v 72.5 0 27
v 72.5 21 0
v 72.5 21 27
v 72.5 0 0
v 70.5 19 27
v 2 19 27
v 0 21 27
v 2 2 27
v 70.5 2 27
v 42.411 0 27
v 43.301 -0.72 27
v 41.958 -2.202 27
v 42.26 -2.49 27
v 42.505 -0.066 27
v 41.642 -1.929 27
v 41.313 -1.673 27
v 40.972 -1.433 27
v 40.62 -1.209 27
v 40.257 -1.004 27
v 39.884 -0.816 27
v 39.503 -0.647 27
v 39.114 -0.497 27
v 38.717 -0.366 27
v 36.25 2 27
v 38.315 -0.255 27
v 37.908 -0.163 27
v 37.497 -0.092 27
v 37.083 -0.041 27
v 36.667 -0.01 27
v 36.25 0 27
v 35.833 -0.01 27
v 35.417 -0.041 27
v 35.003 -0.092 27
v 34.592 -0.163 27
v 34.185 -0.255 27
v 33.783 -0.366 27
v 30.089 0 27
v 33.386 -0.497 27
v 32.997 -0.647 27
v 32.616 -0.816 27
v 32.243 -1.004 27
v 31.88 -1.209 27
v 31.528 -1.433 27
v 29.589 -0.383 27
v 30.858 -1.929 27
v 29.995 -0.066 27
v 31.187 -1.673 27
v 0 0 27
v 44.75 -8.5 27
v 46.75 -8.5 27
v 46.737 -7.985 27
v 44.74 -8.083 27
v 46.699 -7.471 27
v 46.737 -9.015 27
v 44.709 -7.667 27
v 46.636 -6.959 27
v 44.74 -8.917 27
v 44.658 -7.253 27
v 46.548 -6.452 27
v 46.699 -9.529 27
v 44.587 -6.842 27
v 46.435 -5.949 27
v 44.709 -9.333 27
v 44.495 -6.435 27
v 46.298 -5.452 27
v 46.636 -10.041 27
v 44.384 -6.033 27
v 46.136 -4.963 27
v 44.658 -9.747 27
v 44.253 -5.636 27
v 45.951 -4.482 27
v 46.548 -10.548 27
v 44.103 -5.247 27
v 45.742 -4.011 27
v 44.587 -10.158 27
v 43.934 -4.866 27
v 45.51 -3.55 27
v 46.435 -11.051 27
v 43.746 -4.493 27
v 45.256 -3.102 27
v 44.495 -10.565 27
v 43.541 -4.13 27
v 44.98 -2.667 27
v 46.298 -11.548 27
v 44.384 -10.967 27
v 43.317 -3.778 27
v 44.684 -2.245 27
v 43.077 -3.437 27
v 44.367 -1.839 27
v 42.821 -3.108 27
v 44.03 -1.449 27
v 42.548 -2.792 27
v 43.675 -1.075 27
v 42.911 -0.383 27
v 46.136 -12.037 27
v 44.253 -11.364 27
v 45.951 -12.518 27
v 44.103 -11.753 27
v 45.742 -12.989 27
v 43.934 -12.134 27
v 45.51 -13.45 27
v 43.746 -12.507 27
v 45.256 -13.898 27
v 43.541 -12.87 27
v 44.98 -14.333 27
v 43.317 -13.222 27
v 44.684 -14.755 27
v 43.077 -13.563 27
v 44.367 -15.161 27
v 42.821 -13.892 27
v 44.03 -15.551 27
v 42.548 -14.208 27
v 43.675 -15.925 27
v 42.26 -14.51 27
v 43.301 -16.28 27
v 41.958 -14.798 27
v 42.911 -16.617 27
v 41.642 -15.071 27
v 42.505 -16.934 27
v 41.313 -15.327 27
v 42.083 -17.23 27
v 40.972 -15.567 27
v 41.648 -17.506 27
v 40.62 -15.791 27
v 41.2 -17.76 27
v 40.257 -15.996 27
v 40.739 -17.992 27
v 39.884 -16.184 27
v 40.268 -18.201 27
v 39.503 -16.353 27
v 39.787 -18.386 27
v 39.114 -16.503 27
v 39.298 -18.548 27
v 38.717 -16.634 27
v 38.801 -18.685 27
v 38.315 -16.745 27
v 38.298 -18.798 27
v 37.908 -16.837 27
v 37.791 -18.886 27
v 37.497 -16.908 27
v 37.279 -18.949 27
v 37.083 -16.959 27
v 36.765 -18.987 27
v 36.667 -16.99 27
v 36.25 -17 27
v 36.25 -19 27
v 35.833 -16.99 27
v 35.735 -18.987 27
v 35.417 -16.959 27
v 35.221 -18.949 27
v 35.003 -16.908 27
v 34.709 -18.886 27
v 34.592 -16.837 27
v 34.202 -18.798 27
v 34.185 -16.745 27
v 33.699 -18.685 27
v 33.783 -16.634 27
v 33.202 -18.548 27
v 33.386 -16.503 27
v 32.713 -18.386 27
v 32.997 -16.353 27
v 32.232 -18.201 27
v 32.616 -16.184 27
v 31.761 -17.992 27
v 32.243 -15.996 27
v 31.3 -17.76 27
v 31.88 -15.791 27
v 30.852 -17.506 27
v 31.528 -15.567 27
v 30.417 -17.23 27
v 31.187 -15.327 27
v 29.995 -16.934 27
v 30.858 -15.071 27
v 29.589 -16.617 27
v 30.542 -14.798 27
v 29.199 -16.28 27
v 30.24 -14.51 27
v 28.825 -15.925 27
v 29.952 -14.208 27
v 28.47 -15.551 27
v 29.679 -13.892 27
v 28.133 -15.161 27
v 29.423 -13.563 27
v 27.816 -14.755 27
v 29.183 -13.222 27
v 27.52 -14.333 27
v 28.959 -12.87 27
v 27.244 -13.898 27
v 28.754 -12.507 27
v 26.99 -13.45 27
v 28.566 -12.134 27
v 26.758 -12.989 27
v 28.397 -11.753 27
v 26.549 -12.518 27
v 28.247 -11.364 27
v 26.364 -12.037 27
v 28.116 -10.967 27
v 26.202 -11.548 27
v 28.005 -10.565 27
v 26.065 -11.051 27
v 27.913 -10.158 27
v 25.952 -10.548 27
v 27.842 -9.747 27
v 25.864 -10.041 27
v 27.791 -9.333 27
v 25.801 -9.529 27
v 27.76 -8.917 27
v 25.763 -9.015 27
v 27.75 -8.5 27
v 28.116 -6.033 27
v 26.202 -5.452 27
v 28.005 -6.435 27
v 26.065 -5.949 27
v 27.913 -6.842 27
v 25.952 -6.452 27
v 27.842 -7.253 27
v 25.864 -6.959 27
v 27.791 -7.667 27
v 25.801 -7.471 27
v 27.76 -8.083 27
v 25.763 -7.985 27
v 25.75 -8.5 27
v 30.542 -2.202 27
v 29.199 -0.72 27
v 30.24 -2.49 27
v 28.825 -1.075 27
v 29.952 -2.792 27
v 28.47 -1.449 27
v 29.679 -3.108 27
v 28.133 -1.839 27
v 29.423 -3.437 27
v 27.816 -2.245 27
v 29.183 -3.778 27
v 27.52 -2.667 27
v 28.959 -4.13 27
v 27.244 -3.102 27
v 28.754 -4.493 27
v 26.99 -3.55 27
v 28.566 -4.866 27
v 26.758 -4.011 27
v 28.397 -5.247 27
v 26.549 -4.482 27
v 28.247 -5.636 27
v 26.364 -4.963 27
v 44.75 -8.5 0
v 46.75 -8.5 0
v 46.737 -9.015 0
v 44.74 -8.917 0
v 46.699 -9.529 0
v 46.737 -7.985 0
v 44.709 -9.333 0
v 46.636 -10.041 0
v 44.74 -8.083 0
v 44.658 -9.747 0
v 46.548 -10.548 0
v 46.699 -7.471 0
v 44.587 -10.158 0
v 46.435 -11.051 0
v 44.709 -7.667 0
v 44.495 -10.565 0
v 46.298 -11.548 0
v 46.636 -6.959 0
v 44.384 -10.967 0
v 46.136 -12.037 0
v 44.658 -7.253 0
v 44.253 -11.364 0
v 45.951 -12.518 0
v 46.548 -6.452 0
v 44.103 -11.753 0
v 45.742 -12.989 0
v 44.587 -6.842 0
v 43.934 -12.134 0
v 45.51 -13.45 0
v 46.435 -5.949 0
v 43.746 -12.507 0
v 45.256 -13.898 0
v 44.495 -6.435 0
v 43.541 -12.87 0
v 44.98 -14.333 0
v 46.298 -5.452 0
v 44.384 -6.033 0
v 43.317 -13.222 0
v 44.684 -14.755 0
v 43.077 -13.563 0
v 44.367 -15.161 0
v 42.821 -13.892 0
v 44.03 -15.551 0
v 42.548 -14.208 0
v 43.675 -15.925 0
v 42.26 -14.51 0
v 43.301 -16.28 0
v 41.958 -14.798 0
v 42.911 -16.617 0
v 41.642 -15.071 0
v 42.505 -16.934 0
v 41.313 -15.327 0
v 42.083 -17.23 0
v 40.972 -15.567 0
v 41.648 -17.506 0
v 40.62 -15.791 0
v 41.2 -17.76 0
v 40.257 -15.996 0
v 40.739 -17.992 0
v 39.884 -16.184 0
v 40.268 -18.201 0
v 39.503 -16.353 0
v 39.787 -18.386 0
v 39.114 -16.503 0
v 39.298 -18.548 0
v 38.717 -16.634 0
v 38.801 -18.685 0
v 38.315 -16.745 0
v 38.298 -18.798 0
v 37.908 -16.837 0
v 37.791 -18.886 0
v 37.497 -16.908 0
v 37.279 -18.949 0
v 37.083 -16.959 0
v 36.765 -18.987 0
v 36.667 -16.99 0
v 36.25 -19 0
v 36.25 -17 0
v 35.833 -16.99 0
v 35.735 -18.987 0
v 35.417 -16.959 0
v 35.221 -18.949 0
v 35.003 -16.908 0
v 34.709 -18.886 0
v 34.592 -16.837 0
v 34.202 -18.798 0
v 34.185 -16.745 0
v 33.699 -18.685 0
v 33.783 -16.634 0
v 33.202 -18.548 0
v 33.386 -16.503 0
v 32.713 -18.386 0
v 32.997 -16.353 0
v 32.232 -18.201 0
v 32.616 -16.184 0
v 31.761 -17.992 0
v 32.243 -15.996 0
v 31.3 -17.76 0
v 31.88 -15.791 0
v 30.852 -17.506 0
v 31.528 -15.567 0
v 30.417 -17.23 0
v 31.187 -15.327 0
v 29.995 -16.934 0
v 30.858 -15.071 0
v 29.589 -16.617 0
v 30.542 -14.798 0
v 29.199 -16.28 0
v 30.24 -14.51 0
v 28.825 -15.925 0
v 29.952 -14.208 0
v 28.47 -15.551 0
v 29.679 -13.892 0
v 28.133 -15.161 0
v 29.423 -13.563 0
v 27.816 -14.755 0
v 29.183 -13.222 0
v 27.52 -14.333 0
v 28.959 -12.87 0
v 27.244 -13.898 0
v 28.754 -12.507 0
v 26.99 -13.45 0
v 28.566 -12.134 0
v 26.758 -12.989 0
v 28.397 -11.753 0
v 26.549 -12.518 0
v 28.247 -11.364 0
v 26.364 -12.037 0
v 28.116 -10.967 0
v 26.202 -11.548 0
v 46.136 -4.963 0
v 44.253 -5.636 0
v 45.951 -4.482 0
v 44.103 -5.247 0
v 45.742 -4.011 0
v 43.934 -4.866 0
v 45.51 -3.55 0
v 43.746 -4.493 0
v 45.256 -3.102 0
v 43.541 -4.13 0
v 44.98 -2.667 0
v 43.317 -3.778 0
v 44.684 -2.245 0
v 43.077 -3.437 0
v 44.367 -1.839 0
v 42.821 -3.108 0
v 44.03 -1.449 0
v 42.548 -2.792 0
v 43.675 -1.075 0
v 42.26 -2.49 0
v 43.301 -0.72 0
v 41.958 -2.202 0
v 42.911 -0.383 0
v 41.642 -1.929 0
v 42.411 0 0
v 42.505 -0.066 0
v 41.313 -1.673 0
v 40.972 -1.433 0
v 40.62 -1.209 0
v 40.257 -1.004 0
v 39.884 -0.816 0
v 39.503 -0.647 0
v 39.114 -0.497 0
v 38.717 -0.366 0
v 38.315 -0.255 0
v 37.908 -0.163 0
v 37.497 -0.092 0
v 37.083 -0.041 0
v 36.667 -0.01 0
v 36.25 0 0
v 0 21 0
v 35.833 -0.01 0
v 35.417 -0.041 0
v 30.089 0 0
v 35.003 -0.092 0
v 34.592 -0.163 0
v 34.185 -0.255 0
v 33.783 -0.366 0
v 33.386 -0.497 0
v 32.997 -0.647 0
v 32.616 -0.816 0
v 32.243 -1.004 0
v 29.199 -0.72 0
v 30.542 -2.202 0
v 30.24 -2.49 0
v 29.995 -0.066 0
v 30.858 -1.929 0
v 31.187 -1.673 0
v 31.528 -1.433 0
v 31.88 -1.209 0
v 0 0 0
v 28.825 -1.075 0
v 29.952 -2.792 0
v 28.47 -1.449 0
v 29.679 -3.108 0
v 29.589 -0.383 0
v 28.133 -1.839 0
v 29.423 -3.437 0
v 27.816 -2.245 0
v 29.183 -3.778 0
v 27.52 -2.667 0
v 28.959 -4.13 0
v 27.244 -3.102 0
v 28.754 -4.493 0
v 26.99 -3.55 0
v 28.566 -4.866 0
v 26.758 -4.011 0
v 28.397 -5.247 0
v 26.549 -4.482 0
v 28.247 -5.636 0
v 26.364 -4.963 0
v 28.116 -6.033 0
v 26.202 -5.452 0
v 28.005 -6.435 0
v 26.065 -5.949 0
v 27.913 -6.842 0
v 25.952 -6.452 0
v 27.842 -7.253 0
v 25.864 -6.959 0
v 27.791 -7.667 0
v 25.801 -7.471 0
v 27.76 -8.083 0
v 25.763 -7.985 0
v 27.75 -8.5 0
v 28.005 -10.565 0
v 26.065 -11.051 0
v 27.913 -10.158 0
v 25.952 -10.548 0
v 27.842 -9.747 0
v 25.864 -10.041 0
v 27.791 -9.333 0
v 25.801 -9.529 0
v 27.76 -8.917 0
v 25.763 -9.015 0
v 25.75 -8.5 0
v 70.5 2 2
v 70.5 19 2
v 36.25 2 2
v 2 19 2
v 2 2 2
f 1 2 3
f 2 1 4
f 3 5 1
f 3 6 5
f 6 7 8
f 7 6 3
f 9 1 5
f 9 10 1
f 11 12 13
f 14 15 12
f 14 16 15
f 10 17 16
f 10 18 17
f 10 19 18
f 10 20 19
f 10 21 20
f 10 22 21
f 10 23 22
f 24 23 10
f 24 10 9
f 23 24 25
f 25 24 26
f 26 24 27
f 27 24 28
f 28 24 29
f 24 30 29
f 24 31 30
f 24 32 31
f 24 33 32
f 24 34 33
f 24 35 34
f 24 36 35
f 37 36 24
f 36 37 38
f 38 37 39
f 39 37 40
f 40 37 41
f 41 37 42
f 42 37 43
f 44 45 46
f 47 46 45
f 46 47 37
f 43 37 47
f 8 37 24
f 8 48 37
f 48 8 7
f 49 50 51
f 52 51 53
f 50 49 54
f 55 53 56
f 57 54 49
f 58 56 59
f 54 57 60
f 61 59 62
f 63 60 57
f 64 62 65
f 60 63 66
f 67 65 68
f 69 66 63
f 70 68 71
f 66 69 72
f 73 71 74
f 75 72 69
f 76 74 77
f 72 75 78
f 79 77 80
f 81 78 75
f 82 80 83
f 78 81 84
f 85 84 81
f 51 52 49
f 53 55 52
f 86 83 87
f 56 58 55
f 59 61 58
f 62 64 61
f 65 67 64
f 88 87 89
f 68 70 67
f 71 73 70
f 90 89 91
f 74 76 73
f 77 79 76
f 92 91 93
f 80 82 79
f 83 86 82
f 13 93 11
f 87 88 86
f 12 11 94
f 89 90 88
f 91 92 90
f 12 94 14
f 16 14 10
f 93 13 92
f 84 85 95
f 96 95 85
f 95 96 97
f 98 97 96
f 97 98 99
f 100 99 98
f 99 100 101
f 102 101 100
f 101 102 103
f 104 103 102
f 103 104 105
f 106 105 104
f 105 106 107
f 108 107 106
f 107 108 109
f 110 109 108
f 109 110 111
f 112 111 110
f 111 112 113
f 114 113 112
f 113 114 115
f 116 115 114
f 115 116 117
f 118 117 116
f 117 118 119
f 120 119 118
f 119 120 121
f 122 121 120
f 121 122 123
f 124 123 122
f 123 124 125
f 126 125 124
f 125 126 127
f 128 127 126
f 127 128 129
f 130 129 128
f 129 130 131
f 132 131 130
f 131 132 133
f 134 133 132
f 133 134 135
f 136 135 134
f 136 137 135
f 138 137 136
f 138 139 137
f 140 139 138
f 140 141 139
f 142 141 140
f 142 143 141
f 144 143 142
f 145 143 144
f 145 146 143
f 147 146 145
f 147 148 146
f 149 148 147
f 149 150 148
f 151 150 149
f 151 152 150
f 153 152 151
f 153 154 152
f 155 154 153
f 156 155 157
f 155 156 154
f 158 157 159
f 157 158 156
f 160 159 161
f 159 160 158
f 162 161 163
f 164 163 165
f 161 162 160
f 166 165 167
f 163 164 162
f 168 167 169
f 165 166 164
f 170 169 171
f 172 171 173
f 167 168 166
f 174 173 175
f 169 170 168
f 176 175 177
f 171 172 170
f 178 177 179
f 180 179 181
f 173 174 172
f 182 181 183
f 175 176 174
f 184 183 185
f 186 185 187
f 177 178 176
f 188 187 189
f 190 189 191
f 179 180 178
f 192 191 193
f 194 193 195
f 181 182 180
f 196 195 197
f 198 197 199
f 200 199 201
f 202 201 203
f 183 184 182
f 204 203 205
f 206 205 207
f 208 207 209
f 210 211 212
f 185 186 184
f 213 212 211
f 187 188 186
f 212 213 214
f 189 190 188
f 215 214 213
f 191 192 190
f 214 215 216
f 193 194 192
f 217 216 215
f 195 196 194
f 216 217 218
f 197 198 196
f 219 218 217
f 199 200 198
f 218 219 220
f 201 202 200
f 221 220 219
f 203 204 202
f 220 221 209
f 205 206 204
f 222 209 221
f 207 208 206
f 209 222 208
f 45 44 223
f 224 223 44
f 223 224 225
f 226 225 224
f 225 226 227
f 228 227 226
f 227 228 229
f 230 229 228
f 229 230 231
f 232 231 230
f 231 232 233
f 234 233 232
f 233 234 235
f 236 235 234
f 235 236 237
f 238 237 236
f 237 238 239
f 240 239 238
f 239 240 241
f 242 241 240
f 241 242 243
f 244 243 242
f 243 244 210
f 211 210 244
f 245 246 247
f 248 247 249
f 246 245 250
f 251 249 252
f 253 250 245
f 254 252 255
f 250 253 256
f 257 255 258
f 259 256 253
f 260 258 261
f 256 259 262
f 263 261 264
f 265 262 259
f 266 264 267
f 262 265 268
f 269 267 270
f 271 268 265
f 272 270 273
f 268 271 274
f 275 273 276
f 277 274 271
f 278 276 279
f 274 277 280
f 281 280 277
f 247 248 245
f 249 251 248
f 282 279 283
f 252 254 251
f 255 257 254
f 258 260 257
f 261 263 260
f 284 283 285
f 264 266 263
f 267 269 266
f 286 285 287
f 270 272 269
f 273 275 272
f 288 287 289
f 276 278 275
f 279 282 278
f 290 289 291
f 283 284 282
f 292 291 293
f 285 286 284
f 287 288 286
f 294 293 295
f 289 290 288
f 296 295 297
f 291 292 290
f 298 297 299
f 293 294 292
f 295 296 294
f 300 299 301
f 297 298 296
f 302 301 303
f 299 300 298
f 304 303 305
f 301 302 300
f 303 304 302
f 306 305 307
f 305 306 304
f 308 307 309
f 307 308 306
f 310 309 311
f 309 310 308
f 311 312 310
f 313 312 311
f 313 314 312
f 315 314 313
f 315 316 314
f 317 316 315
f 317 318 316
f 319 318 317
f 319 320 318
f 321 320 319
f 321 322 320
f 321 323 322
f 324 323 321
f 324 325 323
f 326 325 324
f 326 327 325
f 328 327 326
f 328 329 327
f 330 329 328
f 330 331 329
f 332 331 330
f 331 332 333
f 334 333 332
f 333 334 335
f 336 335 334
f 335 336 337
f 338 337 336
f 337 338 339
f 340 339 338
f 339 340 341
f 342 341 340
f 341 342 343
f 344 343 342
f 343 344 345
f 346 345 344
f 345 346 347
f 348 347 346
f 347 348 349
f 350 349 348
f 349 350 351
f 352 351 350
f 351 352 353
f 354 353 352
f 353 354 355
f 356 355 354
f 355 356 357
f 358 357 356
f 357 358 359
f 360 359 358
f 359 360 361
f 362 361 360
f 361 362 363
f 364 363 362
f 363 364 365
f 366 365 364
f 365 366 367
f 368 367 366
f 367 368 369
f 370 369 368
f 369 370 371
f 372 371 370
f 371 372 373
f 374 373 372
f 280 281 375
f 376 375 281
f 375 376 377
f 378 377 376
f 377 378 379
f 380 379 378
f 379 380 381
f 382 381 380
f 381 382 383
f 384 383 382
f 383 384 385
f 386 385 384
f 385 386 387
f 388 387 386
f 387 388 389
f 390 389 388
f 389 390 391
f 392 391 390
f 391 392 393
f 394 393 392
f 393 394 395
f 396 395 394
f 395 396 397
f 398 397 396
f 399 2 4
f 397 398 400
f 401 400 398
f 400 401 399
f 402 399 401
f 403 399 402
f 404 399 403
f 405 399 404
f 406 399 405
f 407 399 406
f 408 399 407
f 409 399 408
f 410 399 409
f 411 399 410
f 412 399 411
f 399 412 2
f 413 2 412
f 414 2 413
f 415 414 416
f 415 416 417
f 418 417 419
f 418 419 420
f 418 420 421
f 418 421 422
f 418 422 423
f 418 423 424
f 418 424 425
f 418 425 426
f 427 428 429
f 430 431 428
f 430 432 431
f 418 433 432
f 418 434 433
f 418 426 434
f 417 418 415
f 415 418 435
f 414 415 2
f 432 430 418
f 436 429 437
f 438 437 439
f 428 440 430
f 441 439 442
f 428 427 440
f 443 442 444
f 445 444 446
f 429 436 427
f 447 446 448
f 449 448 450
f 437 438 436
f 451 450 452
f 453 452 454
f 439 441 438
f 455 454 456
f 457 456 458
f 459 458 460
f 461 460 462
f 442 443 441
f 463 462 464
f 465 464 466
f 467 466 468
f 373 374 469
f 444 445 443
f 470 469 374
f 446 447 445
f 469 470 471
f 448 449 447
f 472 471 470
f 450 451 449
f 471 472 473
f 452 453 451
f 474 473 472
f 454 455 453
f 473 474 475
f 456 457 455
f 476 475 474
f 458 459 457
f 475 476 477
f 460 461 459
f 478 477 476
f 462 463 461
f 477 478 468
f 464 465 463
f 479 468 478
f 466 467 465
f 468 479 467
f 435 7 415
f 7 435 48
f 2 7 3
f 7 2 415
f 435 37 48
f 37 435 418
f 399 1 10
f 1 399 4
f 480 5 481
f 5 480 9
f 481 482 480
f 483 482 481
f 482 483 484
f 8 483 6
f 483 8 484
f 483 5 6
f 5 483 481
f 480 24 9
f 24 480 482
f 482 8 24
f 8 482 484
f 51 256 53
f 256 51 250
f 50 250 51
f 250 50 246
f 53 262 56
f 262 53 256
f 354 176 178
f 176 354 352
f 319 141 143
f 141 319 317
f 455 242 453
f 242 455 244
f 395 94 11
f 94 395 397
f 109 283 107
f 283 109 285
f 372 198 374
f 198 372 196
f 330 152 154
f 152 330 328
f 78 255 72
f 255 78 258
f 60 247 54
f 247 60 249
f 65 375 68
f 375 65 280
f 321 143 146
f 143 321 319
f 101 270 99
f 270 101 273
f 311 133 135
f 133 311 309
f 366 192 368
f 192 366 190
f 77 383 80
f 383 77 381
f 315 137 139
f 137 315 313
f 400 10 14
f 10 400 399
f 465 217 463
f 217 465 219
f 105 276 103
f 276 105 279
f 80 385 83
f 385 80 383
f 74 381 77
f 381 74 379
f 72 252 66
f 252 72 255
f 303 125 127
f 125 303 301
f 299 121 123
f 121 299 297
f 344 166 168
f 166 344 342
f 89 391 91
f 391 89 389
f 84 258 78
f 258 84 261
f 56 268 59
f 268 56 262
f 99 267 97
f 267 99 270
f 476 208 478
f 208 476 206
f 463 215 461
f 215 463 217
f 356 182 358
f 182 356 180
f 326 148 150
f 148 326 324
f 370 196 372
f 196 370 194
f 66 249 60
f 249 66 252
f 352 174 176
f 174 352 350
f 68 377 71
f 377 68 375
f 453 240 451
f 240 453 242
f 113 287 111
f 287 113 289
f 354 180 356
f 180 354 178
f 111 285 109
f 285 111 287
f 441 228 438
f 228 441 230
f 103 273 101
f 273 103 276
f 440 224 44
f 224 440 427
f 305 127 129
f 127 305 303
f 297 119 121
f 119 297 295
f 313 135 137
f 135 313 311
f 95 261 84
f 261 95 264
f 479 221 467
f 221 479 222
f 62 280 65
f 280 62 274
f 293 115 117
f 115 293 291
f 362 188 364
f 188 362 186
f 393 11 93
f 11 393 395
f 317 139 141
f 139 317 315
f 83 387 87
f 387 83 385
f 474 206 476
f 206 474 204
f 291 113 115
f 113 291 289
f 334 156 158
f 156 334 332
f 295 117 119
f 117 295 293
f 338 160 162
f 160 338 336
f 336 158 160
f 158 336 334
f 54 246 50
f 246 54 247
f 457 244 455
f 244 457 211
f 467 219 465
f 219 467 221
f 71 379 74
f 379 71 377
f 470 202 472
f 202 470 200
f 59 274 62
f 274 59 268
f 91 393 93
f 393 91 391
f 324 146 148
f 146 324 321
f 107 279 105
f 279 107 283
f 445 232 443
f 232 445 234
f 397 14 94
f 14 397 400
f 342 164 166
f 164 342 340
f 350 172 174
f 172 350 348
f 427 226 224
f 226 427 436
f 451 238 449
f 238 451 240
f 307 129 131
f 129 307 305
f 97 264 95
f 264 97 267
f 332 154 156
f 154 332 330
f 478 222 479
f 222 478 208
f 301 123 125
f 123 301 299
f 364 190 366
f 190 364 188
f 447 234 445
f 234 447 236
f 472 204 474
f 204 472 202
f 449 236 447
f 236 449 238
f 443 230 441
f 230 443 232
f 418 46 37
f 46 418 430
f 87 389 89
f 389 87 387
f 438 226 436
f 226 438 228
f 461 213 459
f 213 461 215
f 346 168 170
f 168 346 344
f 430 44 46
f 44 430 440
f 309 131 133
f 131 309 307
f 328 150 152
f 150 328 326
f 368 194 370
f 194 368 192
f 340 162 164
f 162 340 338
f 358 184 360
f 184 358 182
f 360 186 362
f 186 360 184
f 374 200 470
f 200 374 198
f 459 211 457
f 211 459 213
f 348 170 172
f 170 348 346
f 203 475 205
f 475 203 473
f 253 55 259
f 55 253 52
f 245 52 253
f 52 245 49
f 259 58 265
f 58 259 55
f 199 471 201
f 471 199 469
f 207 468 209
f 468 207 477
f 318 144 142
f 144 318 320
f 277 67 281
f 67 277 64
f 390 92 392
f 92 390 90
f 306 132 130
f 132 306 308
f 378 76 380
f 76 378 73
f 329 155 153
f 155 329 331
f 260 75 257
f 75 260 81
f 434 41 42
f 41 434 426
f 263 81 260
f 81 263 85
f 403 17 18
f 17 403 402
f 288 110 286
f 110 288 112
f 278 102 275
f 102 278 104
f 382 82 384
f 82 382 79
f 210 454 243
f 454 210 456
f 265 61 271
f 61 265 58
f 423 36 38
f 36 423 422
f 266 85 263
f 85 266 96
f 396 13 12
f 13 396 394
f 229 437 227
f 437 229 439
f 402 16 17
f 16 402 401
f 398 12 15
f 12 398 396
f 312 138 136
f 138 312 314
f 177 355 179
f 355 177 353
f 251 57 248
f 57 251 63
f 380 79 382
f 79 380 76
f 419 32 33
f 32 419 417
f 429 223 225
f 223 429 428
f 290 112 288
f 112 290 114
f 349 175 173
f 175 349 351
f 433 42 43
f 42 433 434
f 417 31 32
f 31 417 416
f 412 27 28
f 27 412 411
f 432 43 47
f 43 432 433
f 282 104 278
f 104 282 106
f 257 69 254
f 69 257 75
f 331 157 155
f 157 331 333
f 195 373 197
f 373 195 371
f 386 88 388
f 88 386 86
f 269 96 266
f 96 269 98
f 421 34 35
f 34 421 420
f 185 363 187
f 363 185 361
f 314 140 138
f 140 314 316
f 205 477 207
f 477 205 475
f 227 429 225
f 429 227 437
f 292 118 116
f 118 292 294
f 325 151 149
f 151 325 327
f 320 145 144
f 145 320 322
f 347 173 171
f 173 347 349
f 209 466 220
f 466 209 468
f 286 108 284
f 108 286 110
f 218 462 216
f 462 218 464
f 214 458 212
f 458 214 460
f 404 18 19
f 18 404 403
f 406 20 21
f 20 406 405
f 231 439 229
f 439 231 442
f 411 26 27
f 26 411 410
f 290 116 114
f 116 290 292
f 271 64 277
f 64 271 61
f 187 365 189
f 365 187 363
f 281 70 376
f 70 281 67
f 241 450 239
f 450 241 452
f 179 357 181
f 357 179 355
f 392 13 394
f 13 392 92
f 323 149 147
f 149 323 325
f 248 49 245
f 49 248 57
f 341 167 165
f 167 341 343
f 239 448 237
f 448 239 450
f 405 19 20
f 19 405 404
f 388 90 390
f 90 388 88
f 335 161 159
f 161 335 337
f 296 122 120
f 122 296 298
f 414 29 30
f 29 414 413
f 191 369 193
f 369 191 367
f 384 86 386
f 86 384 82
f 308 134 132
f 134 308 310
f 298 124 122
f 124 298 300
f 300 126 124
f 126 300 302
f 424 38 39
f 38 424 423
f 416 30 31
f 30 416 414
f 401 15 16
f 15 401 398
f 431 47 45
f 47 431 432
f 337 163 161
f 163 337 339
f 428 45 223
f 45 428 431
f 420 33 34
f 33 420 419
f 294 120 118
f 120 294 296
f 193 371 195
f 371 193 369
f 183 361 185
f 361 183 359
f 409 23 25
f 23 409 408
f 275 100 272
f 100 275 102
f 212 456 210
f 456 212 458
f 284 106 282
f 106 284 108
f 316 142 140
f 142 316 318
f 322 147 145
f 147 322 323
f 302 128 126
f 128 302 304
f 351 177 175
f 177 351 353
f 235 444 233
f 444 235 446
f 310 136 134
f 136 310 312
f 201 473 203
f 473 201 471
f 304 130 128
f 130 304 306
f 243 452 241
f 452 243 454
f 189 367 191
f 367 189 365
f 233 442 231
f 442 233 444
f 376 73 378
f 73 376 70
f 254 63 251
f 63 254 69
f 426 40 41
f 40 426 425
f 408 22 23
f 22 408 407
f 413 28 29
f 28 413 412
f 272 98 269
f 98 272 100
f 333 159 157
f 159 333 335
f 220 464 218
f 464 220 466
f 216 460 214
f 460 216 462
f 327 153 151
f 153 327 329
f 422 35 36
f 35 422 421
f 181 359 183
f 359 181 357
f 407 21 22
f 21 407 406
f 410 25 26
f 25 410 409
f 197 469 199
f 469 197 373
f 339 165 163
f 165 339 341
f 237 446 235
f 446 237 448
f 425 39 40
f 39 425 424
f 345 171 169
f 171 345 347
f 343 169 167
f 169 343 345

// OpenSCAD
POLE_OD = 17;
BATTERY_WIDTH = 68.5;
BATTERY_DEPTH = 17;
CLIP_HEIGHT = 25;
THICKNESS = 2;
d1 = 0.01;
d2 = d1 * 2;
$fn = 128;

module battery_holder() {
  difference() {
    cube([BATTERY_WIDTH + 2 * THICKNESS, BATTERY_DEPTH + 2 * THICKNESS, CLIP_HEIGHT + THICKNESS]);
    translate([THICKNESS, THICKNESS, THICKNESS])
      cube([BATTERY_WIDTH, BATTERY_DEPTH, CLIP_HEIGHT + d1]);
  }
}

module clip() {
  difference() {
    cylinder(d=POLE_OD + THICKNESS * 2, h=CLIP_HEIGHT + THICKNESS);
    translate([0, 0, -d1])
      cylinder(d=POLE_OD, h=CLIP_HEIGHT + THICKNESS + d2);
    
  }
}

battery_holder();
translate([BATTERY_WIDTH / 2 + THICKNESS, -POLE_OD / 2, 0])
  clip();
